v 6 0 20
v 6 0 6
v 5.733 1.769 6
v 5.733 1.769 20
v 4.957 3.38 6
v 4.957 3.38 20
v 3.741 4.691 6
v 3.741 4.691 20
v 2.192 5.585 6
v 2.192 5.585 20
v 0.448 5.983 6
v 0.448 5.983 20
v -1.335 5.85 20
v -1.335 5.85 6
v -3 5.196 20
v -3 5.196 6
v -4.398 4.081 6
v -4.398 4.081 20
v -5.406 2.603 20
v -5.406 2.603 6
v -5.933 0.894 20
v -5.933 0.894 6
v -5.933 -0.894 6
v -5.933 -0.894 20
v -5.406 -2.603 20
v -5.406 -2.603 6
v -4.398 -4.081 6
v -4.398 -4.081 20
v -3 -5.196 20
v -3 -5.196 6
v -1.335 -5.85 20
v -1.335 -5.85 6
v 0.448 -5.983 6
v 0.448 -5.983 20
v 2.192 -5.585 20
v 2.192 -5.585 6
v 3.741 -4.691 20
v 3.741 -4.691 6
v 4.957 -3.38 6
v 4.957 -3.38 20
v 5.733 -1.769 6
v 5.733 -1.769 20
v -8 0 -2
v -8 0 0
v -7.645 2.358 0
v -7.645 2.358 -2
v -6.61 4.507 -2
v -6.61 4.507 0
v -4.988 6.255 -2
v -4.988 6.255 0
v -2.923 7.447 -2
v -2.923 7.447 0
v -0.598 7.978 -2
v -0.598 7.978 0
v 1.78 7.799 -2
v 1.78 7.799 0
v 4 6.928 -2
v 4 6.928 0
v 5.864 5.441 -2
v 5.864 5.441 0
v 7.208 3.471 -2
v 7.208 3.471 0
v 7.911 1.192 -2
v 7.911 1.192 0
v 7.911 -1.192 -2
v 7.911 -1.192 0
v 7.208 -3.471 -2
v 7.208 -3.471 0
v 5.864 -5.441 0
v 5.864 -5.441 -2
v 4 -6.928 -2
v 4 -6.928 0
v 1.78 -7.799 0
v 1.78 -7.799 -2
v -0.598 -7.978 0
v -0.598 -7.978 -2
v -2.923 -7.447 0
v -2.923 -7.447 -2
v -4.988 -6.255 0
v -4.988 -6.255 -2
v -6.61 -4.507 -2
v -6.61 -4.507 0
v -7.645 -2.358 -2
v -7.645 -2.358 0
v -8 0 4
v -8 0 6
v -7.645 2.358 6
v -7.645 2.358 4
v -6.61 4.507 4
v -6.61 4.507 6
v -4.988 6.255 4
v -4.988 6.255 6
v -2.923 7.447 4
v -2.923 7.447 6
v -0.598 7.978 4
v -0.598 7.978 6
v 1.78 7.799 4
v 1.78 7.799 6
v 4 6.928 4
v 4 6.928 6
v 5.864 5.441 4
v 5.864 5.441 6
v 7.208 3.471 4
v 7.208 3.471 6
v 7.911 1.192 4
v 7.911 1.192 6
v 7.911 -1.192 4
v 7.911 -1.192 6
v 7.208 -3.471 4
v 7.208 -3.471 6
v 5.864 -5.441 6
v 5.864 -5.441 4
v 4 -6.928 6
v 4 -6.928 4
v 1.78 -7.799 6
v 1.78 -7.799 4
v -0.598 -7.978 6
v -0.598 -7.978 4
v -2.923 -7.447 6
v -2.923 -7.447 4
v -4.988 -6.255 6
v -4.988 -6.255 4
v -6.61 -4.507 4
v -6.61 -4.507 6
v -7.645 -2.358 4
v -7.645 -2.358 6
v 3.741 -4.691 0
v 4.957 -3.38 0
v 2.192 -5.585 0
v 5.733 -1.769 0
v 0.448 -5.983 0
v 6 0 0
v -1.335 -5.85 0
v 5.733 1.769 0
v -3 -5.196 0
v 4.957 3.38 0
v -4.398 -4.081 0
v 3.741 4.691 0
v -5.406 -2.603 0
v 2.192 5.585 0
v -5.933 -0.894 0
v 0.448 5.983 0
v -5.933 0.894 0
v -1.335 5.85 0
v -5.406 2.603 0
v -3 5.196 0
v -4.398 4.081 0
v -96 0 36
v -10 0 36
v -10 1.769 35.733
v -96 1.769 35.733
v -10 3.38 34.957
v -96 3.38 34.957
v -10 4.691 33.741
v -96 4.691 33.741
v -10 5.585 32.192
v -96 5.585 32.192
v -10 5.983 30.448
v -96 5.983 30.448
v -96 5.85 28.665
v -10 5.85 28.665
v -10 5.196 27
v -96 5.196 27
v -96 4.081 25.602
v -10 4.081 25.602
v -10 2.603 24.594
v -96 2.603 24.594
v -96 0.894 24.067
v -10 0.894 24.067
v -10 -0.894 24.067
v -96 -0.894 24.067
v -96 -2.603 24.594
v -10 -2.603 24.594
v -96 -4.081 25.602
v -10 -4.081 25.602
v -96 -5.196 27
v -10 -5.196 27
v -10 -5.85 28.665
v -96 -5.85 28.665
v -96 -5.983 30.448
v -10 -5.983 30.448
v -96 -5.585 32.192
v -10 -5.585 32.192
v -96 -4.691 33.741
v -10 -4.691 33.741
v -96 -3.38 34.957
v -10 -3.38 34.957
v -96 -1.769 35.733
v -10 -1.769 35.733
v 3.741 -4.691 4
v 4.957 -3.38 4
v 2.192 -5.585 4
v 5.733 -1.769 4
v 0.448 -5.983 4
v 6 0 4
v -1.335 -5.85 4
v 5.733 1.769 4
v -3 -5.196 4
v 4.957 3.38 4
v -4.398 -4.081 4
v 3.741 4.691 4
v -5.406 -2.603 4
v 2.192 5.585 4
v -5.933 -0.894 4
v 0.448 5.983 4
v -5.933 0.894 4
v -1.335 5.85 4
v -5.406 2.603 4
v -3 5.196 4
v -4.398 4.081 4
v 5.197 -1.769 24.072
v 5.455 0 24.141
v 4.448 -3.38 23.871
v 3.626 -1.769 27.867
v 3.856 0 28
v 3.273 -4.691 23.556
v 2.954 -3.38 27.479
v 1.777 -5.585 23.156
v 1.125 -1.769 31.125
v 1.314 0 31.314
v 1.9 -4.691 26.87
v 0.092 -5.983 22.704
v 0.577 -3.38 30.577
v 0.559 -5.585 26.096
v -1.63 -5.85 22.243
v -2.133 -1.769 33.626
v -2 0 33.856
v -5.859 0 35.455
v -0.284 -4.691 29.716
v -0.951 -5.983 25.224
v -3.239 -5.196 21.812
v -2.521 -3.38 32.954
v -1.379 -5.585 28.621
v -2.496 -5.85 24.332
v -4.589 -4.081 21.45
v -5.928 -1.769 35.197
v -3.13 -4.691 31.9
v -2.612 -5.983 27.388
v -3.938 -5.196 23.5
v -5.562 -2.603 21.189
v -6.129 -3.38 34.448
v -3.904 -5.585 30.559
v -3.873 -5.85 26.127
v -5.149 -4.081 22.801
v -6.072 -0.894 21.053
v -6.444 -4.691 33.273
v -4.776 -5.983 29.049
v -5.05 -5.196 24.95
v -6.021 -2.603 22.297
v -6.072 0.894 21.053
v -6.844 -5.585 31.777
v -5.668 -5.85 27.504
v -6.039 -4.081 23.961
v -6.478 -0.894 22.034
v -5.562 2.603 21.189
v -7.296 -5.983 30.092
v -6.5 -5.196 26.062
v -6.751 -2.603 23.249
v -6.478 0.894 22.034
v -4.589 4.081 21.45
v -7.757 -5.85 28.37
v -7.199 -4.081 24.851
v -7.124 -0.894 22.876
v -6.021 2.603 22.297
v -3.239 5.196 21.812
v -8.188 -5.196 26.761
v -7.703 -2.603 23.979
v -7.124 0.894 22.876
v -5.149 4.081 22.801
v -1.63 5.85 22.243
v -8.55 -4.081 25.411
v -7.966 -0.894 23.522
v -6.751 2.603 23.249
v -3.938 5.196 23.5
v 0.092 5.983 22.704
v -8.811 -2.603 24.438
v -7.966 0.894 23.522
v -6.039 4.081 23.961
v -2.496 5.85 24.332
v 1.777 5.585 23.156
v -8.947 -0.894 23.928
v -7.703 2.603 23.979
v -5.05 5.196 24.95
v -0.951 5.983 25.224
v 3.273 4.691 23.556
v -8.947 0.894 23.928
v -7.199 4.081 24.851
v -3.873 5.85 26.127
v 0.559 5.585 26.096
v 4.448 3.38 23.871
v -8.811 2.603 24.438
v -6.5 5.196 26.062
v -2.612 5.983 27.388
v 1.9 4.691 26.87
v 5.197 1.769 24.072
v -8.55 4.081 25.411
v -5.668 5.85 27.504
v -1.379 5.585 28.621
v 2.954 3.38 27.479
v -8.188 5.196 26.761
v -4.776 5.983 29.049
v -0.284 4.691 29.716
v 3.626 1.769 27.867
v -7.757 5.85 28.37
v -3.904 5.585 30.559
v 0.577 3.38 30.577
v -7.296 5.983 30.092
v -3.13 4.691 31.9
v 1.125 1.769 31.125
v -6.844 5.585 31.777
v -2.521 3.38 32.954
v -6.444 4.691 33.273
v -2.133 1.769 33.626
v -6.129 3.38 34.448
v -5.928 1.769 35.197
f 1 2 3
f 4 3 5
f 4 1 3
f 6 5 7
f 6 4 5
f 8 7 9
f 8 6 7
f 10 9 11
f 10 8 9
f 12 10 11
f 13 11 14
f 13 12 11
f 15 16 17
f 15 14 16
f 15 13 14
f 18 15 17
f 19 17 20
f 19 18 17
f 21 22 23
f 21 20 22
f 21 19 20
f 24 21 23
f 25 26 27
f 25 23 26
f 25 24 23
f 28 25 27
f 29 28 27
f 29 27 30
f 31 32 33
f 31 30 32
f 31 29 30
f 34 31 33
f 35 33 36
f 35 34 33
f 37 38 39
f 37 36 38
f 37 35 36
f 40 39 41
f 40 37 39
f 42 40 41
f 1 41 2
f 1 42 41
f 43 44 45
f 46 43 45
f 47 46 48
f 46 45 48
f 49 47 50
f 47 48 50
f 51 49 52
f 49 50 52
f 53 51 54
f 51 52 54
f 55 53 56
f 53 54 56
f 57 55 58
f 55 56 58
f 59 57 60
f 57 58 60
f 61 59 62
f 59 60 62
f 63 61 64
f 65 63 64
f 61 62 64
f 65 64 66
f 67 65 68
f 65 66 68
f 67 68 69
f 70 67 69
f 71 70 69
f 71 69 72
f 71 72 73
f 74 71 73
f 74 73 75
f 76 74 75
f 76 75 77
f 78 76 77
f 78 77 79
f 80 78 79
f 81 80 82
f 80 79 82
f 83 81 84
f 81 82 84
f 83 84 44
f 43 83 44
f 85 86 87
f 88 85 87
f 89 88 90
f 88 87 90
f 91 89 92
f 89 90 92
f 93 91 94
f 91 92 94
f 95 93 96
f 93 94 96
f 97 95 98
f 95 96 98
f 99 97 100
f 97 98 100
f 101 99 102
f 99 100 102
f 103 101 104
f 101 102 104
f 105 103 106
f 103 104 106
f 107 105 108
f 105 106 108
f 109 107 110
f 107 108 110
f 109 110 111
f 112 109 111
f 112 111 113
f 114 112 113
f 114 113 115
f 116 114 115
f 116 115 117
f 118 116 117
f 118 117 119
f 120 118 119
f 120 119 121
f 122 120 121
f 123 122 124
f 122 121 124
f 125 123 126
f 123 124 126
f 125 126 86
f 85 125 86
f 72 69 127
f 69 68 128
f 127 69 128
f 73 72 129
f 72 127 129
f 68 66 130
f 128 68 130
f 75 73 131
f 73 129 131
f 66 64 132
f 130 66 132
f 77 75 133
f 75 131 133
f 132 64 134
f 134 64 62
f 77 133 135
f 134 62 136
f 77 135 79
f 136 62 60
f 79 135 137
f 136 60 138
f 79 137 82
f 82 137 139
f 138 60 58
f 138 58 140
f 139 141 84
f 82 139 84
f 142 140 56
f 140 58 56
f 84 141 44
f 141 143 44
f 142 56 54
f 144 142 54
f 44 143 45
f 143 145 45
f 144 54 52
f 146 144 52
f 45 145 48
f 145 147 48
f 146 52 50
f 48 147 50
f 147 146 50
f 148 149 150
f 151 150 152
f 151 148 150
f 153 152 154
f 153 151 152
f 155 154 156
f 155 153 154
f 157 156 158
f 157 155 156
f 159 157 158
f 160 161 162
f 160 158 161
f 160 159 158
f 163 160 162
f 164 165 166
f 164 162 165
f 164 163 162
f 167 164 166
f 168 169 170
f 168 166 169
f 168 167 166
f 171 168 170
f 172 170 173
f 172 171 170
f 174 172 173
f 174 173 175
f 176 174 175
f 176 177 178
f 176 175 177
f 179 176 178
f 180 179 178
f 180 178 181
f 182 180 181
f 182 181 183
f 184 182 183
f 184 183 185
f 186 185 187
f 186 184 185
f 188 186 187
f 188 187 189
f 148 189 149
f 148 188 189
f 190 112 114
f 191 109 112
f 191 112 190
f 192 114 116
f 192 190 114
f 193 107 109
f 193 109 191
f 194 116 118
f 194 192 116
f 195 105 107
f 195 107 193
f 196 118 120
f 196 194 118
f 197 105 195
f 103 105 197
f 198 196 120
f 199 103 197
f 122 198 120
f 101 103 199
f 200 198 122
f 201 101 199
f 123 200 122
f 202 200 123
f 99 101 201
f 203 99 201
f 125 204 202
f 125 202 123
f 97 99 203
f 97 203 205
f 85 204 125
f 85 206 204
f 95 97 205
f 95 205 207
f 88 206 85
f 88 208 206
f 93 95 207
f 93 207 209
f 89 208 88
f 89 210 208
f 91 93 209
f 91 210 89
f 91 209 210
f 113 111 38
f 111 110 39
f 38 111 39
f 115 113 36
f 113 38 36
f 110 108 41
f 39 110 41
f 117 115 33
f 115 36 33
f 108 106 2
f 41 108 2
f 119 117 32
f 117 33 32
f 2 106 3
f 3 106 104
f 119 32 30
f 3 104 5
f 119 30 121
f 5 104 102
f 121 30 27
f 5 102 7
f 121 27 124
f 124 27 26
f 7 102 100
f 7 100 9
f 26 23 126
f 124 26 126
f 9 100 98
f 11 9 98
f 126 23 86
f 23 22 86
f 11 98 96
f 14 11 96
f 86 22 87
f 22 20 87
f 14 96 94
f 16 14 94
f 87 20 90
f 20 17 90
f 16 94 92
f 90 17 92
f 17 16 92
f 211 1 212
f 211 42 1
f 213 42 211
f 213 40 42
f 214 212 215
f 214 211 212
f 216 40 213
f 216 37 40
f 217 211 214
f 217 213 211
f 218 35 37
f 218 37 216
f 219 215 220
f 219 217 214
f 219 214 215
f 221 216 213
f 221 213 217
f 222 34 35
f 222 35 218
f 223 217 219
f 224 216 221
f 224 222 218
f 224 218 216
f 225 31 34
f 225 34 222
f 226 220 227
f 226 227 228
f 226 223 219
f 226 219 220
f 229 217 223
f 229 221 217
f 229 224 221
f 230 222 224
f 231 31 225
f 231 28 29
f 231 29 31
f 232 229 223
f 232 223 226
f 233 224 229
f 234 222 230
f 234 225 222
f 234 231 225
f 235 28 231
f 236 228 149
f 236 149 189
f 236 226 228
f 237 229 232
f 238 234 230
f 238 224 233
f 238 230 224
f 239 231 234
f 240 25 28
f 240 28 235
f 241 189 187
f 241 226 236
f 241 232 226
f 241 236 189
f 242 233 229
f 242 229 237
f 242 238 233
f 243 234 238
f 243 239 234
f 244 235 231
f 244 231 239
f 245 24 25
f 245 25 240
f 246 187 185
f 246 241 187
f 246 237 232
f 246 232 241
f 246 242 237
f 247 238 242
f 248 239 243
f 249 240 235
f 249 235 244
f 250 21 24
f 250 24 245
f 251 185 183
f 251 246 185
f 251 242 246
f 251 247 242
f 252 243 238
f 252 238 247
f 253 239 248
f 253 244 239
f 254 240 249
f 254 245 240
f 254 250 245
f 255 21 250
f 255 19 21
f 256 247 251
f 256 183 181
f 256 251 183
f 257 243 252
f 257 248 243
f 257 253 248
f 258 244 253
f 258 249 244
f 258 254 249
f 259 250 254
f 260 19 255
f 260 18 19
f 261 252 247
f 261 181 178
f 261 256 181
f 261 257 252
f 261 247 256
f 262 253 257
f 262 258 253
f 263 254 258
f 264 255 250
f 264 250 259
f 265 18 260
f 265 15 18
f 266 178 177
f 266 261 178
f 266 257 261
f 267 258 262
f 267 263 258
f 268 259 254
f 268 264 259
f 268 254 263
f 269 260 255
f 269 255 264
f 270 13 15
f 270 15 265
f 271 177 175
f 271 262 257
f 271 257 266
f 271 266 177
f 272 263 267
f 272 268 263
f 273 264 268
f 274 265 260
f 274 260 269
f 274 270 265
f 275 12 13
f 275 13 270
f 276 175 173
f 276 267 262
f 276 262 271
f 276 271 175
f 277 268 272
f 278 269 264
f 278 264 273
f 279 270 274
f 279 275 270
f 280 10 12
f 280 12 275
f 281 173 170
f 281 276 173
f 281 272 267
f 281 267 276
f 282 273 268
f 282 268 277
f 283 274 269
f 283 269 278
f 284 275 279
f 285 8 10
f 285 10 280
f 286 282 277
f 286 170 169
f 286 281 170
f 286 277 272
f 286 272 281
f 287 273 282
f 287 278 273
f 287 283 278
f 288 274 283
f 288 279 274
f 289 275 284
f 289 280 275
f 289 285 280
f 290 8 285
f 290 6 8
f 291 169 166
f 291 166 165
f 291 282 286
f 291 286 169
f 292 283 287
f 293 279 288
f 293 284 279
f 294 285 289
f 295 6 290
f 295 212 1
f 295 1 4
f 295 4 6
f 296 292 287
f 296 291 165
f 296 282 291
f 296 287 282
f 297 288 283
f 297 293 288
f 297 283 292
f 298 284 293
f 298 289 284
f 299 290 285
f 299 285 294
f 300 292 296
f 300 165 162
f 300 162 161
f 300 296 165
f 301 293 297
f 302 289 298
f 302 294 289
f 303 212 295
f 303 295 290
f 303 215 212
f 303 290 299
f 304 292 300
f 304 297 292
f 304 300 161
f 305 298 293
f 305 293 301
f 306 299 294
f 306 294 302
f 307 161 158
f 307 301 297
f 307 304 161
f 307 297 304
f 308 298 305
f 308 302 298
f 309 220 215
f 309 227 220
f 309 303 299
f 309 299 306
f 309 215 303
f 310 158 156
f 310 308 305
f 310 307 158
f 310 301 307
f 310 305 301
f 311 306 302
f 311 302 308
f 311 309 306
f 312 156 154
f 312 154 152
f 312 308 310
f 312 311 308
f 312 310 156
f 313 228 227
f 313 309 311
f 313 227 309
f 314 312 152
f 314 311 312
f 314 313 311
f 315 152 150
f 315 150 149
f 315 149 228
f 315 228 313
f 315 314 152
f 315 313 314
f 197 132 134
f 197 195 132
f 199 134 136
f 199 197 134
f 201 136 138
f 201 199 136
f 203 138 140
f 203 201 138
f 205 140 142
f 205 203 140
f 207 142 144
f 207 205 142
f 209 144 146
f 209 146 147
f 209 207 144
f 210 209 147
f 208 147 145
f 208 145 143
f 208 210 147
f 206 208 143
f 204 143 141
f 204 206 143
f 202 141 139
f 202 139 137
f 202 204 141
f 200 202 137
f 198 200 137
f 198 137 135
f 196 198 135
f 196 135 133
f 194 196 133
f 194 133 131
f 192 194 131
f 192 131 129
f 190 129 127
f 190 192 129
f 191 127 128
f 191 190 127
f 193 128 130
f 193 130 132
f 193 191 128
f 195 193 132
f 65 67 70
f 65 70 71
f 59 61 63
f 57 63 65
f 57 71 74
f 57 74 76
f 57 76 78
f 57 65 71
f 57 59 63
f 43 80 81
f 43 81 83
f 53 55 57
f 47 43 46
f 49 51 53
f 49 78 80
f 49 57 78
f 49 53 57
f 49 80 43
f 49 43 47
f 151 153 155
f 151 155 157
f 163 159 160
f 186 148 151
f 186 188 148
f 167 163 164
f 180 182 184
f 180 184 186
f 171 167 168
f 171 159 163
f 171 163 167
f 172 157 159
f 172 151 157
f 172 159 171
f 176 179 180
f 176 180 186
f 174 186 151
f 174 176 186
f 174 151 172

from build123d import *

# Parameters (mm, degrees)
SKETCH2_R           = 6
SKETCH4_R           = 8
BOSS_EXTRUDE1_DEPTH = 2
SKETCH5_R           = 8
SKETCH5_R_2         = 6
BOSS_EXTRUDE2_DEPTH = 2


with BuildPart() as part:
    # Sweep1: sweep along a curve in space
    with BuildLine() as sweep1_path:
        Line((0, 0, 0), (0, 0, 20))
        ThreePointArc((-10, 0, 30), (-2.928932188, 0, 27.071067812), (0, 0, 20))
        Line((-10, 0, 30), (-96, 0, 30))
    # Sketch2 → Sweep1 (sweep)
    with BuildSketch(Plane.XY):
        Circle(SKETCH2_R)
    sweep(path=sweep1_path.line)

    # Sketch4 → Boss-Extrude1 (add)
    with BuildSketch(Plane(origin=(0, 0, 0), x_dir=(-1, 0, 0), z_dir=(0, 0, -1))):
        Circle(SKETCH4_R)
    extrude(amount=BOSS_EXTRUDE1_DEPTH)

    # Sketch5 → Boss-Extrude2 (add)
    with BuildSketch(Plane(origin=(0, 0, 6), x_dir=(-1, 0, 0), z_dir=(0, 0, -1))):
        Circle(SKETCH5_R)
        with Locations(Location((0, 0, 0), (0, 0, 180))):
            Circle(SKETCH5_R_2, mode=Mode.SUBTRACT)
    extrude(amount=BOSS_EXTRUDE2_DEPTH)


solid = part.part
